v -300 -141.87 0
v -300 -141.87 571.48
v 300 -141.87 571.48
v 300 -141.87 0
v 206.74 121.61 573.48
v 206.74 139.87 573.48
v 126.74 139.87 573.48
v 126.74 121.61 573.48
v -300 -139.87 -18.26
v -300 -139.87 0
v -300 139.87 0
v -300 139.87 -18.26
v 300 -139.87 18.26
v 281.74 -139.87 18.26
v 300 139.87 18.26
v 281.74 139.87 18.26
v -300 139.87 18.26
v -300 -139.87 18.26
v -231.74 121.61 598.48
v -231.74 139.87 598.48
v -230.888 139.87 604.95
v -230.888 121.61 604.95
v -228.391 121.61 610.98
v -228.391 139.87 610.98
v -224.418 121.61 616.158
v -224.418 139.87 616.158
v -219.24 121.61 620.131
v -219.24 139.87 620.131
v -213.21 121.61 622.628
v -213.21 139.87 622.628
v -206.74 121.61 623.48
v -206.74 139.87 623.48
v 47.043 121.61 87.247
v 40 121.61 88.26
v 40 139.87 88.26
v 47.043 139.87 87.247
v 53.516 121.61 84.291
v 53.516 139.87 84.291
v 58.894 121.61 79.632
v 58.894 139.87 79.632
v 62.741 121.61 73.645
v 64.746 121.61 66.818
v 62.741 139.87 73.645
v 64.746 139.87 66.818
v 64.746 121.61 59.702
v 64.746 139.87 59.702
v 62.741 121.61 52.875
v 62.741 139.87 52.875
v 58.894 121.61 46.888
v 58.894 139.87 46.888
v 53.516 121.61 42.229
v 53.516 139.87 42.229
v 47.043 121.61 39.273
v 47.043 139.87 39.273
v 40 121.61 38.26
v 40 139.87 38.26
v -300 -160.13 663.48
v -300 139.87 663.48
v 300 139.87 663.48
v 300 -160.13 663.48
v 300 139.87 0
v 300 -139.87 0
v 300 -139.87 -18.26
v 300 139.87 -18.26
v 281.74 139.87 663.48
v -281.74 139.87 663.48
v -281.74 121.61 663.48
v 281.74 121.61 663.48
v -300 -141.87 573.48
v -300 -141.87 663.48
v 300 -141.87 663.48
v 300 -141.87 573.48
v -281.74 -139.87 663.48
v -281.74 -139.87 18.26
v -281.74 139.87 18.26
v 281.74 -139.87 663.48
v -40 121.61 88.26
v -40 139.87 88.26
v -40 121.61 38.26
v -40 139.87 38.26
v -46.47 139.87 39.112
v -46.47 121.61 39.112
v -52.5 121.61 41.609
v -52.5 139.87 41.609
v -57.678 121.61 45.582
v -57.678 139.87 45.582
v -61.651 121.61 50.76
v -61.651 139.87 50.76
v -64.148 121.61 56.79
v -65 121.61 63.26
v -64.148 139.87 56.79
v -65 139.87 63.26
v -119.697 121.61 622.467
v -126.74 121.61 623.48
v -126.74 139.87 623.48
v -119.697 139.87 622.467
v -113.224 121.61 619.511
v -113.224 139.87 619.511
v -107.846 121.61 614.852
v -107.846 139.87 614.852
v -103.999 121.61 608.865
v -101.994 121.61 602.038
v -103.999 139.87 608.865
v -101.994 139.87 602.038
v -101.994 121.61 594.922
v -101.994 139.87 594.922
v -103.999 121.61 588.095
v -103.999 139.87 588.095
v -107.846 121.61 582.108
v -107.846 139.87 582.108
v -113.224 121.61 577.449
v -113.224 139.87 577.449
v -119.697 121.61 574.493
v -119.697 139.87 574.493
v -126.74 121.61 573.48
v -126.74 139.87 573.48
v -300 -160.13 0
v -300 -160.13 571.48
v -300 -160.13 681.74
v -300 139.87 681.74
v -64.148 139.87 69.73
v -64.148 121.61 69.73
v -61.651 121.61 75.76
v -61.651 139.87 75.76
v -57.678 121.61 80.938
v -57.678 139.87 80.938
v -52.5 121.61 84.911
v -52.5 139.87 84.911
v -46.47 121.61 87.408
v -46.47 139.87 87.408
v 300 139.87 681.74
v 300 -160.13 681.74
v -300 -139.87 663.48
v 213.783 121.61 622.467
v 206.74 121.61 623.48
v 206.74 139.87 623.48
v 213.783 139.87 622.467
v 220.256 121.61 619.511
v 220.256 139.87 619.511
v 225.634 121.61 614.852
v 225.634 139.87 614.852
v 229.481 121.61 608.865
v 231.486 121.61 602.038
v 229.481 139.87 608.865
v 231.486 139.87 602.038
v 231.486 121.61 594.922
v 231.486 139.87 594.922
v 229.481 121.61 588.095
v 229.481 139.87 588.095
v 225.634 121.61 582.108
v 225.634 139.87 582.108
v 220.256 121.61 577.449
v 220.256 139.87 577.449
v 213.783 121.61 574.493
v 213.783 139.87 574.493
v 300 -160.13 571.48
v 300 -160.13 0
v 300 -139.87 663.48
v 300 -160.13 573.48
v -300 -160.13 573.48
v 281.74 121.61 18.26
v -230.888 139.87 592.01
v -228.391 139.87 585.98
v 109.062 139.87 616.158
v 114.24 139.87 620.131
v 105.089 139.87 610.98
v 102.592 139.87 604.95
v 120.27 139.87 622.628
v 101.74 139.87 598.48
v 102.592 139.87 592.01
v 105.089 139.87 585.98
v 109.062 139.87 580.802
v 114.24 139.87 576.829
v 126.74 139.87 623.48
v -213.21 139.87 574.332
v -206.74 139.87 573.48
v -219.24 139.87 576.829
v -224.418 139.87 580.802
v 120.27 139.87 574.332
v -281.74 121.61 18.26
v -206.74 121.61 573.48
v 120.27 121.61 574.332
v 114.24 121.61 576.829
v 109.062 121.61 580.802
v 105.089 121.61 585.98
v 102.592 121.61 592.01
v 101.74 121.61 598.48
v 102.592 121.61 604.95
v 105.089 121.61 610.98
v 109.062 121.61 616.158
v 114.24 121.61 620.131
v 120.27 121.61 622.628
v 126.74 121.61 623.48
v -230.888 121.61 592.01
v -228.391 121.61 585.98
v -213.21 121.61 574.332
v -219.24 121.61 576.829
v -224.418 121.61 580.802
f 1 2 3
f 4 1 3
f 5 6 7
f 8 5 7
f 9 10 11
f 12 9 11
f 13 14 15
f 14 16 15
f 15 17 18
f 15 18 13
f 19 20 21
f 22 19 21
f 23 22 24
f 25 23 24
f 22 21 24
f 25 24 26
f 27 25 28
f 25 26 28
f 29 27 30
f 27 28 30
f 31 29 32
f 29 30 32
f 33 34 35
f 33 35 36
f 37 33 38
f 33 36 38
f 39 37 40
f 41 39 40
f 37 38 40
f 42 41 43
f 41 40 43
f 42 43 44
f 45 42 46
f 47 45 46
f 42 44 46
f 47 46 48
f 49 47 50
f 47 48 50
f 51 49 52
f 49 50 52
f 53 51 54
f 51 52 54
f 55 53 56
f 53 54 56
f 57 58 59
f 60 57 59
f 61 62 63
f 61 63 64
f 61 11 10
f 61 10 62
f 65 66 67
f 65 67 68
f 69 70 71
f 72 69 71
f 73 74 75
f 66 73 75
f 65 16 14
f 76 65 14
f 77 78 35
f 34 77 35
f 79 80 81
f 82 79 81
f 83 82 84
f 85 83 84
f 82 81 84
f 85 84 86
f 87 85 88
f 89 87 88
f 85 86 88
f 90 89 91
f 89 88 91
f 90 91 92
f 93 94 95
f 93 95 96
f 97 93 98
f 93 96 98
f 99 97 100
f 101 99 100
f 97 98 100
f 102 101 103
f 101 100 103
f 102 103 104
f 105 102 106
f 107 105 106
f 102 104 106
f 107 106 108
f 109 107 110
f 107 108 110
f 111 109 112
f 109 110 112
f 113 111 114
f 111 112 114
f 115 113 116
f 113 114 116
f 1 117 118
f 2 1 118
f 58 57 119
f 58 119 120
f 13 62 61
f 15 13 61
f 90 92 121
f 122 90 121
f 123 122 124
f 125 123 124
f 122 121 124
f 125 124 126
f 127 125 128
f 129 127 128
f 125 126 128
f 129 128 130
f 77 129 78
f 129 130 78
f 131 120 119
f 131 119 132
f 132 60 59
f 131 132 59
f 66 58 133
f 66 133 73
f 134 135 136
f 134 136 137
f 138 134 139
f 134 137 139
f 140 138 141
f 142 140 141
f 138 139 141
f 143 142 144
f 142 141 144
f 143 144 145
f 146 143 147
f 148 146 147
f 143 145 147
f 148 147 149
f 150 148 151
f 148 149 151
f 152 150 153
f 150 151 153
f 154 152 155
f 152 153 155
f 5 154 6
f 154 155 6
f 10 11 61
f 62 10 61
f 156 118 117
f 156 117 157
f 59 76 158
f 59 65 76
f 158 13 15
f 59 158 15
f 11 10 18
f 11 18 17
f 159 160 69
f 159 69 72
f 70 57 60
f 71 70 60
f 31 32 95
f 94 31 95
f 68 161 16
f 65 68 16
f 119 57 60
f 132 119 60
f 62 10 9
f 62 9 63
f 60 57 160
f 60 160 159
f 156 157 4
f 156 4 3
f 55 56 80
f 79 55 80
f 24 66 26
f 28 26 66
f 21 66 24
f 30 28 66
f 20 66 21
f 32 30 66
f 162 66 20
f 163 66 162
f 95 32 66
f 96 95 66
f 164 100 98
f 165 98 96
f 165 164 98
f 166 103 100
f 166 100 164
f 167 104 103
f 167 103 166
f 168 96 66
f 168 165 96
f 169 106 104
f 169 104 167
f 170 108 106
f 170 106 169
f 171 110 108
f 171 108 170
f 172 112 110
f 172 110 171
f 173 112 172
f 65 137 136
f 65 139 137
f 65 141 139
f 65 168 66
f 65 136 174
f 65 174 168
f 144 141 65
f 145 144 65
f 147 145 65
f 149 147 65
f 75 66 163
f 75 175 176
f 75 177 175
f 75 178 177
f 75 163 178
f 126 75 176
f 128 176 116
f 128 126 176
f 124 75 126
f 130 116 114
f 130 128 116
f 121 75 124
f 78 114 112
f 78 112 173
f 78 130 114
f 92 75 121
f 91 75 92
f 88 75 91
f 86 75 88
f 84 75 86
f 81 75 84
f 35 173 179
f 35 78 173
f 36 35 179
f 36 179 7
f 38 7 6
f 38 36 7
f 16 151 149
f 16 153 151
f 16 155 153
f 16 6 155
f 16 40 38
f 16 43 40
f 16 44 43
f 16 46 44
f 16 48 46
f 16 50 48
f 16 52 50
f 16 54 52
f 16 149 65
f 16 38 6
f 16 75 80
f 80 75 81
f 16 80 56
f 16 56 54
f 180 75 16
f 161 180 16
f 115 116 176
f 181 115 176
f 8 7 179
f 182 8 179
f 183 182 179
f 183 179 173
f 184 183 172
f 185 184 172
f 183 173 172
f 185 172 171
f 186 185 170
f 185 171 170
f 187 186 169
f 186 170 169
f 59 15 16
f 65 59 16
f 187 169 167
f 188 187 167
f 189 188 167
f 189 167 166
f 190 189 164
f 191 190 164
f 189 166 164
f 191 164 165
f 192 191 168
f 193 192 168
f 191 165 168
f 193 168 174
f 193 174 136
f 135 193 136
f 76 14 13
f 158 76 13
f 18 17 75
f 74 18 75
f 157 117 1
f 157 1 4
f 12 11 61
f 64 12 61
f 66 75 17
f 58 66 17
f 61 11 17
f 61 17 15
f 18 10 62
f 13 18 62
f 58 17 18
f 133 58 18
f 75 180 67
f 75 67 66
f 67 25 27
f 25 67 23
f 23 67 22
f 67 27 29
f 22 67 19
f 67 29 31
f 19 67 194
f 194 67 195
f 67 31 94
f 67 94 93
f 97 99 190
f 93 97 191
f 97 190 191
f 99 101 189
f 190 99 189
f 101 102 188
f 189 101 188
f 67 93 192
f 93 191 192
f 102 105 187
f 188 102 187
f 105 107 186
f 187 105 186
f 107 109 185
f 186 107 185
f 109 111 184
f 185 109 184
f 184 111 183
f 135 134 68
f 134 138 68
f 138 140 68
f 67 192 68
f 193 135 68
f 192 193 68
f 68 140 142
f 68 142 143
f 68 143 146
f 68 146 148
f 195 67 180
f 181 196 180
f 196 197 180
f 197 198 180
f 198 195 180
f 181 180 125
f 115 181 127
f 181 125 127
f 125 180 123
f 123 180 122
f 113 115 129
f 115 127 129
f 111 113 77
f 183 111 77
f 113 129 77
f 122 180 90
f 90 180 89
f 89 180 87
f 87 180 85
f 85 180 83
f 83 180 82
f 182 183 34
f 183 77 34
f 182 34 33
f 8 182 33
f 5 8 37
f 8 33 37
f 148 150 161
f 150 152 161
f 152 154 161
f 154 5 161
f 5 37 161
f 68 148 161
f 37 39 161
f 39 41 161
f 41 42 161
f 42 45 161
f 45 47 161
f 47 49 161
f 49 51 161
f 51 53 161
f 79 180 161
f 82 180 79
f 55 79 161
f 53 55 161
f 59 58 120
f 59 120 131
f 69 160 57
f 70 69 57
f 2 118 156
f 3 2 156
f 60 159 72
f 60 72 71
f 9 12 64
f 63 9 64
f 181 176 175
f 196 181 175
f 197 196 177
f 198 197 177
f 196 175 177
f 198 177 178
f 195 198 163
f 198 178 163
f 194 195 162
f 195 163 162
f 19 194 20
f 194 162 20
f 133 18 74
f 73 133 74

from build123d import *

# Parameters (mm, degrees)
F0_W      = 600
F0_H      = 279.74
F1_DEPTH  = 18.26
F3_DEPTH  = 645.22
F2_W      = 563.48
F2_H      = 18.26
F4_DEPTH  = 645.22
F5_DEPTH  = 645.22
F6_W      = 600
F6_H      = 300
F7_DEPTH  = 18.26
F8_DEPTH  = 18.26
F10_DEPTH = 25
F11_W     = 600
F11_H     = 90
F12_DEPTH = 18.26
F13_W     = 600
F13_H     = 571.48
F14_DEPTH = 18.26


with BuildPart() as f1:
    # F0 (on Top) → F1 (new body)
    with BuildSketch(Plane.XY):
        Rectangle(F0_W, F0_H)
    extrude(amount=F1_DEPTH)


with BuildPart() as f3:
    # F2 (on face) → F3 (new body)
    with BuildSketch(Plane.XY.offset(18.26)):
        Polygon((281.74, 121.61), (281.74, -139.87), (300, -139.87), (300, 139.87), (281.74, 139.87), align=None)
    extrude(amount=F3_DEPTH)


with BuildPart() as f4:
    # F2 (on face) → F4 (new body, through all)
    with BuildSketch(Plane.XY.offset(18.26)):
        with Locations((0, 130.74)):
            Rectangle(F2_W, F2_H)
    extrude(amount=F4_DEPTH)

    # F9 (on face) → F10 (cut)
    with BuildSketch(Plane(origin=(0, 139.87, 0), x_dir=(-1, 0, 0), z_dir=(0, 1, 0))):
        with BuildLine():
            ThreePointArc((126.74, 573.48), (144.4176695297, 580.8023304703), (151.74, 598.48))
            ThreePointArc((151.74, 598.48), (144.4176695297, 616.1576695297), (126.74, 623.48))
            ThreePointArc((126.74, 623.48), (101.74, 598.48), (126.74, 573.48))
        make_face()
        with BuildLine():
            ThreePointArc((126.74, 623.48), (144.4176695297, 616.1576695297), (151.74, 598.48))
            ThreePointArc((151.74, 598.48), (144.4176695297, 580.8023304703), (126.74, 573.48))
            Line((126.74, 573.48), (206.74, 573.48))
            ThreePointArc((206.74, 573.48), (181.74, 598.48), (206.74, 623.48))
            Line((206.74, 623.48), (126.74, 623.48))
        make_face()
        with BuildLine():
            ThreePointArc((231.74, 598.48), (224.4176695297, 616.1576695297), (206.74, 623.48))
            ThreePointArc((206.74, 623.48), (181.74, 598.48), (206.74, 573.48))
            ThreePointArc((206.74, 573.48), (224.4176695297, 580.8023304703), (231.74, 598.48))
        make_face()
        with BuildLine():
            ThreePointArc((-126.74, 573.48), (-109.0623304703, 580.8023304703), (-101.74, 598.48))
            ThreePointArc((-101.74, 598.48), (-109.0623304703, 616.1576695297), (-126.74, 623.48))
            ThreePointArc((-126.74, 623.48), (-151.74, 598.48), (-126.74, 573.48))
        make_face()
        with BuildLine():
            ThreePointArc((-126.74, 573.48), (-151.74, 598.48), (-126.74, 623.48))
            Line((-126.74, 623.48), (-206.74, 623.48))
            ThreePointArc((-206.74, 623.48), (-189.0623304703, 616.1576695297), (-181.74, 598.48))
            ThreePointArc((-181.74, 598.48), (-189.0623304703, 580.8023304703), (-206.74, 573.48))
            Line((-206.74, 573.48), (-126.74, 573.48))
        make_face()
        with BuildLine():
            ThreePointArc((-181.74, 598.48), (-189.0623304703, 616.1576695297), (-206.74, 623.48))
            ThreePointArc((-206.74, 623.48), (-231.74, 598.48), (-206.74, 573.48))
            ThreePointArc((-206.74, 573.48), (-189.0623304703, 580.8023304703), (-181.74, 598.48))
        make_face()
        with BuildLine():
            ThreePointArc((40, 38.26), (57.6776695297, 45.5823304703), (65, 63.26))
            ThreePointArc((65, 63.26), (57.6776695297, 80.9376695297), (40, 88.26))
            ThreePointArc((40, 88.26), (15, 63.26), (40, 38.26))
        make_face()
        with BuildLine():
            ThreePointArc((40, 38.26), (15, 63.26), (40, 88.26))
            Line((40, 88.26), (-40, 88.26))
            ThreePointArc((-40, 88.26), (-22.3223304703, 80.9376695297), (-15, 63.26))
            ThreePointArc((-15, 63.26), (-22.3223304703, 45.5823304703), (-40, 38.26))
            Line((-40, 38.26), (40, 38.26))
        make_face()
        with BuildLine():
            ThreePointArc((-15, 63.26), (-22.3223304703, 80.9376695297), (-40, 88.26))
            ThreePointArc((-40, 88.26), (-65, 63.26), (-40, 38.26))
            ThreePointArc((-40, 38.26), (-22.3223304703, 45.5823304703), (-15, 63.26))
        make_face()
    extrude(amount=-F10_DEPTH, mode=Mode.SUBTRACT)


with BuildPart() as f5:
    # F2 (on face) → F5 (new body, through all)
    with BuildSketch(Plane.XY.offset(18.26)):
        Polygon((-300, 139.87), (-300, -139.87), (-281.74, -139.87), (-281.74, 121.61), (-281.74, 139.87), align=None)
    extrude(amount=F5_DEPTH)


with BuildPart() as f7:
    # F6 (on face) → F7 (new body)
    with BuildSketch(Plane.XY.offset(663.48)):
        with Locations((0, -10.13)):
            Rectangle(F6_W, F6_H)
    extrude(amount=F7_DEPTH)


with BuildPart() as f8:
    # F8 (new): a face of the model
    f8_faces = [f1.part.faces().sort_by_distance(p)[0] for p in [
        (0, 0, 0),
    ]]
    extrude(f8_faces, amount=F8_DEPTH)


with BuildPart() as f12:
    # F11 (on face) → F12 (new body)
    with BuildSketch(Plane.XZ.offset(160.13)):
        with Locations((0, 618.48)):
            Rectangle(F11_W, F11_H)
    extrude(amount=-F12_DEPTH)


with BuildPart() as f14:
    # F13 (on face) → F14 (new body)
    with BuildSketch(Plane.XZ.offset(160.13)):
        with Locations((0, 285.74)):
            Rectangle(F13_W, F13_H)
    extrude(amount=-F14_DEPTH)


solid = Compound([f1.part, f3.part, f4.part, f5.part, f7.part, f8.part, f12.part, f14.part])
